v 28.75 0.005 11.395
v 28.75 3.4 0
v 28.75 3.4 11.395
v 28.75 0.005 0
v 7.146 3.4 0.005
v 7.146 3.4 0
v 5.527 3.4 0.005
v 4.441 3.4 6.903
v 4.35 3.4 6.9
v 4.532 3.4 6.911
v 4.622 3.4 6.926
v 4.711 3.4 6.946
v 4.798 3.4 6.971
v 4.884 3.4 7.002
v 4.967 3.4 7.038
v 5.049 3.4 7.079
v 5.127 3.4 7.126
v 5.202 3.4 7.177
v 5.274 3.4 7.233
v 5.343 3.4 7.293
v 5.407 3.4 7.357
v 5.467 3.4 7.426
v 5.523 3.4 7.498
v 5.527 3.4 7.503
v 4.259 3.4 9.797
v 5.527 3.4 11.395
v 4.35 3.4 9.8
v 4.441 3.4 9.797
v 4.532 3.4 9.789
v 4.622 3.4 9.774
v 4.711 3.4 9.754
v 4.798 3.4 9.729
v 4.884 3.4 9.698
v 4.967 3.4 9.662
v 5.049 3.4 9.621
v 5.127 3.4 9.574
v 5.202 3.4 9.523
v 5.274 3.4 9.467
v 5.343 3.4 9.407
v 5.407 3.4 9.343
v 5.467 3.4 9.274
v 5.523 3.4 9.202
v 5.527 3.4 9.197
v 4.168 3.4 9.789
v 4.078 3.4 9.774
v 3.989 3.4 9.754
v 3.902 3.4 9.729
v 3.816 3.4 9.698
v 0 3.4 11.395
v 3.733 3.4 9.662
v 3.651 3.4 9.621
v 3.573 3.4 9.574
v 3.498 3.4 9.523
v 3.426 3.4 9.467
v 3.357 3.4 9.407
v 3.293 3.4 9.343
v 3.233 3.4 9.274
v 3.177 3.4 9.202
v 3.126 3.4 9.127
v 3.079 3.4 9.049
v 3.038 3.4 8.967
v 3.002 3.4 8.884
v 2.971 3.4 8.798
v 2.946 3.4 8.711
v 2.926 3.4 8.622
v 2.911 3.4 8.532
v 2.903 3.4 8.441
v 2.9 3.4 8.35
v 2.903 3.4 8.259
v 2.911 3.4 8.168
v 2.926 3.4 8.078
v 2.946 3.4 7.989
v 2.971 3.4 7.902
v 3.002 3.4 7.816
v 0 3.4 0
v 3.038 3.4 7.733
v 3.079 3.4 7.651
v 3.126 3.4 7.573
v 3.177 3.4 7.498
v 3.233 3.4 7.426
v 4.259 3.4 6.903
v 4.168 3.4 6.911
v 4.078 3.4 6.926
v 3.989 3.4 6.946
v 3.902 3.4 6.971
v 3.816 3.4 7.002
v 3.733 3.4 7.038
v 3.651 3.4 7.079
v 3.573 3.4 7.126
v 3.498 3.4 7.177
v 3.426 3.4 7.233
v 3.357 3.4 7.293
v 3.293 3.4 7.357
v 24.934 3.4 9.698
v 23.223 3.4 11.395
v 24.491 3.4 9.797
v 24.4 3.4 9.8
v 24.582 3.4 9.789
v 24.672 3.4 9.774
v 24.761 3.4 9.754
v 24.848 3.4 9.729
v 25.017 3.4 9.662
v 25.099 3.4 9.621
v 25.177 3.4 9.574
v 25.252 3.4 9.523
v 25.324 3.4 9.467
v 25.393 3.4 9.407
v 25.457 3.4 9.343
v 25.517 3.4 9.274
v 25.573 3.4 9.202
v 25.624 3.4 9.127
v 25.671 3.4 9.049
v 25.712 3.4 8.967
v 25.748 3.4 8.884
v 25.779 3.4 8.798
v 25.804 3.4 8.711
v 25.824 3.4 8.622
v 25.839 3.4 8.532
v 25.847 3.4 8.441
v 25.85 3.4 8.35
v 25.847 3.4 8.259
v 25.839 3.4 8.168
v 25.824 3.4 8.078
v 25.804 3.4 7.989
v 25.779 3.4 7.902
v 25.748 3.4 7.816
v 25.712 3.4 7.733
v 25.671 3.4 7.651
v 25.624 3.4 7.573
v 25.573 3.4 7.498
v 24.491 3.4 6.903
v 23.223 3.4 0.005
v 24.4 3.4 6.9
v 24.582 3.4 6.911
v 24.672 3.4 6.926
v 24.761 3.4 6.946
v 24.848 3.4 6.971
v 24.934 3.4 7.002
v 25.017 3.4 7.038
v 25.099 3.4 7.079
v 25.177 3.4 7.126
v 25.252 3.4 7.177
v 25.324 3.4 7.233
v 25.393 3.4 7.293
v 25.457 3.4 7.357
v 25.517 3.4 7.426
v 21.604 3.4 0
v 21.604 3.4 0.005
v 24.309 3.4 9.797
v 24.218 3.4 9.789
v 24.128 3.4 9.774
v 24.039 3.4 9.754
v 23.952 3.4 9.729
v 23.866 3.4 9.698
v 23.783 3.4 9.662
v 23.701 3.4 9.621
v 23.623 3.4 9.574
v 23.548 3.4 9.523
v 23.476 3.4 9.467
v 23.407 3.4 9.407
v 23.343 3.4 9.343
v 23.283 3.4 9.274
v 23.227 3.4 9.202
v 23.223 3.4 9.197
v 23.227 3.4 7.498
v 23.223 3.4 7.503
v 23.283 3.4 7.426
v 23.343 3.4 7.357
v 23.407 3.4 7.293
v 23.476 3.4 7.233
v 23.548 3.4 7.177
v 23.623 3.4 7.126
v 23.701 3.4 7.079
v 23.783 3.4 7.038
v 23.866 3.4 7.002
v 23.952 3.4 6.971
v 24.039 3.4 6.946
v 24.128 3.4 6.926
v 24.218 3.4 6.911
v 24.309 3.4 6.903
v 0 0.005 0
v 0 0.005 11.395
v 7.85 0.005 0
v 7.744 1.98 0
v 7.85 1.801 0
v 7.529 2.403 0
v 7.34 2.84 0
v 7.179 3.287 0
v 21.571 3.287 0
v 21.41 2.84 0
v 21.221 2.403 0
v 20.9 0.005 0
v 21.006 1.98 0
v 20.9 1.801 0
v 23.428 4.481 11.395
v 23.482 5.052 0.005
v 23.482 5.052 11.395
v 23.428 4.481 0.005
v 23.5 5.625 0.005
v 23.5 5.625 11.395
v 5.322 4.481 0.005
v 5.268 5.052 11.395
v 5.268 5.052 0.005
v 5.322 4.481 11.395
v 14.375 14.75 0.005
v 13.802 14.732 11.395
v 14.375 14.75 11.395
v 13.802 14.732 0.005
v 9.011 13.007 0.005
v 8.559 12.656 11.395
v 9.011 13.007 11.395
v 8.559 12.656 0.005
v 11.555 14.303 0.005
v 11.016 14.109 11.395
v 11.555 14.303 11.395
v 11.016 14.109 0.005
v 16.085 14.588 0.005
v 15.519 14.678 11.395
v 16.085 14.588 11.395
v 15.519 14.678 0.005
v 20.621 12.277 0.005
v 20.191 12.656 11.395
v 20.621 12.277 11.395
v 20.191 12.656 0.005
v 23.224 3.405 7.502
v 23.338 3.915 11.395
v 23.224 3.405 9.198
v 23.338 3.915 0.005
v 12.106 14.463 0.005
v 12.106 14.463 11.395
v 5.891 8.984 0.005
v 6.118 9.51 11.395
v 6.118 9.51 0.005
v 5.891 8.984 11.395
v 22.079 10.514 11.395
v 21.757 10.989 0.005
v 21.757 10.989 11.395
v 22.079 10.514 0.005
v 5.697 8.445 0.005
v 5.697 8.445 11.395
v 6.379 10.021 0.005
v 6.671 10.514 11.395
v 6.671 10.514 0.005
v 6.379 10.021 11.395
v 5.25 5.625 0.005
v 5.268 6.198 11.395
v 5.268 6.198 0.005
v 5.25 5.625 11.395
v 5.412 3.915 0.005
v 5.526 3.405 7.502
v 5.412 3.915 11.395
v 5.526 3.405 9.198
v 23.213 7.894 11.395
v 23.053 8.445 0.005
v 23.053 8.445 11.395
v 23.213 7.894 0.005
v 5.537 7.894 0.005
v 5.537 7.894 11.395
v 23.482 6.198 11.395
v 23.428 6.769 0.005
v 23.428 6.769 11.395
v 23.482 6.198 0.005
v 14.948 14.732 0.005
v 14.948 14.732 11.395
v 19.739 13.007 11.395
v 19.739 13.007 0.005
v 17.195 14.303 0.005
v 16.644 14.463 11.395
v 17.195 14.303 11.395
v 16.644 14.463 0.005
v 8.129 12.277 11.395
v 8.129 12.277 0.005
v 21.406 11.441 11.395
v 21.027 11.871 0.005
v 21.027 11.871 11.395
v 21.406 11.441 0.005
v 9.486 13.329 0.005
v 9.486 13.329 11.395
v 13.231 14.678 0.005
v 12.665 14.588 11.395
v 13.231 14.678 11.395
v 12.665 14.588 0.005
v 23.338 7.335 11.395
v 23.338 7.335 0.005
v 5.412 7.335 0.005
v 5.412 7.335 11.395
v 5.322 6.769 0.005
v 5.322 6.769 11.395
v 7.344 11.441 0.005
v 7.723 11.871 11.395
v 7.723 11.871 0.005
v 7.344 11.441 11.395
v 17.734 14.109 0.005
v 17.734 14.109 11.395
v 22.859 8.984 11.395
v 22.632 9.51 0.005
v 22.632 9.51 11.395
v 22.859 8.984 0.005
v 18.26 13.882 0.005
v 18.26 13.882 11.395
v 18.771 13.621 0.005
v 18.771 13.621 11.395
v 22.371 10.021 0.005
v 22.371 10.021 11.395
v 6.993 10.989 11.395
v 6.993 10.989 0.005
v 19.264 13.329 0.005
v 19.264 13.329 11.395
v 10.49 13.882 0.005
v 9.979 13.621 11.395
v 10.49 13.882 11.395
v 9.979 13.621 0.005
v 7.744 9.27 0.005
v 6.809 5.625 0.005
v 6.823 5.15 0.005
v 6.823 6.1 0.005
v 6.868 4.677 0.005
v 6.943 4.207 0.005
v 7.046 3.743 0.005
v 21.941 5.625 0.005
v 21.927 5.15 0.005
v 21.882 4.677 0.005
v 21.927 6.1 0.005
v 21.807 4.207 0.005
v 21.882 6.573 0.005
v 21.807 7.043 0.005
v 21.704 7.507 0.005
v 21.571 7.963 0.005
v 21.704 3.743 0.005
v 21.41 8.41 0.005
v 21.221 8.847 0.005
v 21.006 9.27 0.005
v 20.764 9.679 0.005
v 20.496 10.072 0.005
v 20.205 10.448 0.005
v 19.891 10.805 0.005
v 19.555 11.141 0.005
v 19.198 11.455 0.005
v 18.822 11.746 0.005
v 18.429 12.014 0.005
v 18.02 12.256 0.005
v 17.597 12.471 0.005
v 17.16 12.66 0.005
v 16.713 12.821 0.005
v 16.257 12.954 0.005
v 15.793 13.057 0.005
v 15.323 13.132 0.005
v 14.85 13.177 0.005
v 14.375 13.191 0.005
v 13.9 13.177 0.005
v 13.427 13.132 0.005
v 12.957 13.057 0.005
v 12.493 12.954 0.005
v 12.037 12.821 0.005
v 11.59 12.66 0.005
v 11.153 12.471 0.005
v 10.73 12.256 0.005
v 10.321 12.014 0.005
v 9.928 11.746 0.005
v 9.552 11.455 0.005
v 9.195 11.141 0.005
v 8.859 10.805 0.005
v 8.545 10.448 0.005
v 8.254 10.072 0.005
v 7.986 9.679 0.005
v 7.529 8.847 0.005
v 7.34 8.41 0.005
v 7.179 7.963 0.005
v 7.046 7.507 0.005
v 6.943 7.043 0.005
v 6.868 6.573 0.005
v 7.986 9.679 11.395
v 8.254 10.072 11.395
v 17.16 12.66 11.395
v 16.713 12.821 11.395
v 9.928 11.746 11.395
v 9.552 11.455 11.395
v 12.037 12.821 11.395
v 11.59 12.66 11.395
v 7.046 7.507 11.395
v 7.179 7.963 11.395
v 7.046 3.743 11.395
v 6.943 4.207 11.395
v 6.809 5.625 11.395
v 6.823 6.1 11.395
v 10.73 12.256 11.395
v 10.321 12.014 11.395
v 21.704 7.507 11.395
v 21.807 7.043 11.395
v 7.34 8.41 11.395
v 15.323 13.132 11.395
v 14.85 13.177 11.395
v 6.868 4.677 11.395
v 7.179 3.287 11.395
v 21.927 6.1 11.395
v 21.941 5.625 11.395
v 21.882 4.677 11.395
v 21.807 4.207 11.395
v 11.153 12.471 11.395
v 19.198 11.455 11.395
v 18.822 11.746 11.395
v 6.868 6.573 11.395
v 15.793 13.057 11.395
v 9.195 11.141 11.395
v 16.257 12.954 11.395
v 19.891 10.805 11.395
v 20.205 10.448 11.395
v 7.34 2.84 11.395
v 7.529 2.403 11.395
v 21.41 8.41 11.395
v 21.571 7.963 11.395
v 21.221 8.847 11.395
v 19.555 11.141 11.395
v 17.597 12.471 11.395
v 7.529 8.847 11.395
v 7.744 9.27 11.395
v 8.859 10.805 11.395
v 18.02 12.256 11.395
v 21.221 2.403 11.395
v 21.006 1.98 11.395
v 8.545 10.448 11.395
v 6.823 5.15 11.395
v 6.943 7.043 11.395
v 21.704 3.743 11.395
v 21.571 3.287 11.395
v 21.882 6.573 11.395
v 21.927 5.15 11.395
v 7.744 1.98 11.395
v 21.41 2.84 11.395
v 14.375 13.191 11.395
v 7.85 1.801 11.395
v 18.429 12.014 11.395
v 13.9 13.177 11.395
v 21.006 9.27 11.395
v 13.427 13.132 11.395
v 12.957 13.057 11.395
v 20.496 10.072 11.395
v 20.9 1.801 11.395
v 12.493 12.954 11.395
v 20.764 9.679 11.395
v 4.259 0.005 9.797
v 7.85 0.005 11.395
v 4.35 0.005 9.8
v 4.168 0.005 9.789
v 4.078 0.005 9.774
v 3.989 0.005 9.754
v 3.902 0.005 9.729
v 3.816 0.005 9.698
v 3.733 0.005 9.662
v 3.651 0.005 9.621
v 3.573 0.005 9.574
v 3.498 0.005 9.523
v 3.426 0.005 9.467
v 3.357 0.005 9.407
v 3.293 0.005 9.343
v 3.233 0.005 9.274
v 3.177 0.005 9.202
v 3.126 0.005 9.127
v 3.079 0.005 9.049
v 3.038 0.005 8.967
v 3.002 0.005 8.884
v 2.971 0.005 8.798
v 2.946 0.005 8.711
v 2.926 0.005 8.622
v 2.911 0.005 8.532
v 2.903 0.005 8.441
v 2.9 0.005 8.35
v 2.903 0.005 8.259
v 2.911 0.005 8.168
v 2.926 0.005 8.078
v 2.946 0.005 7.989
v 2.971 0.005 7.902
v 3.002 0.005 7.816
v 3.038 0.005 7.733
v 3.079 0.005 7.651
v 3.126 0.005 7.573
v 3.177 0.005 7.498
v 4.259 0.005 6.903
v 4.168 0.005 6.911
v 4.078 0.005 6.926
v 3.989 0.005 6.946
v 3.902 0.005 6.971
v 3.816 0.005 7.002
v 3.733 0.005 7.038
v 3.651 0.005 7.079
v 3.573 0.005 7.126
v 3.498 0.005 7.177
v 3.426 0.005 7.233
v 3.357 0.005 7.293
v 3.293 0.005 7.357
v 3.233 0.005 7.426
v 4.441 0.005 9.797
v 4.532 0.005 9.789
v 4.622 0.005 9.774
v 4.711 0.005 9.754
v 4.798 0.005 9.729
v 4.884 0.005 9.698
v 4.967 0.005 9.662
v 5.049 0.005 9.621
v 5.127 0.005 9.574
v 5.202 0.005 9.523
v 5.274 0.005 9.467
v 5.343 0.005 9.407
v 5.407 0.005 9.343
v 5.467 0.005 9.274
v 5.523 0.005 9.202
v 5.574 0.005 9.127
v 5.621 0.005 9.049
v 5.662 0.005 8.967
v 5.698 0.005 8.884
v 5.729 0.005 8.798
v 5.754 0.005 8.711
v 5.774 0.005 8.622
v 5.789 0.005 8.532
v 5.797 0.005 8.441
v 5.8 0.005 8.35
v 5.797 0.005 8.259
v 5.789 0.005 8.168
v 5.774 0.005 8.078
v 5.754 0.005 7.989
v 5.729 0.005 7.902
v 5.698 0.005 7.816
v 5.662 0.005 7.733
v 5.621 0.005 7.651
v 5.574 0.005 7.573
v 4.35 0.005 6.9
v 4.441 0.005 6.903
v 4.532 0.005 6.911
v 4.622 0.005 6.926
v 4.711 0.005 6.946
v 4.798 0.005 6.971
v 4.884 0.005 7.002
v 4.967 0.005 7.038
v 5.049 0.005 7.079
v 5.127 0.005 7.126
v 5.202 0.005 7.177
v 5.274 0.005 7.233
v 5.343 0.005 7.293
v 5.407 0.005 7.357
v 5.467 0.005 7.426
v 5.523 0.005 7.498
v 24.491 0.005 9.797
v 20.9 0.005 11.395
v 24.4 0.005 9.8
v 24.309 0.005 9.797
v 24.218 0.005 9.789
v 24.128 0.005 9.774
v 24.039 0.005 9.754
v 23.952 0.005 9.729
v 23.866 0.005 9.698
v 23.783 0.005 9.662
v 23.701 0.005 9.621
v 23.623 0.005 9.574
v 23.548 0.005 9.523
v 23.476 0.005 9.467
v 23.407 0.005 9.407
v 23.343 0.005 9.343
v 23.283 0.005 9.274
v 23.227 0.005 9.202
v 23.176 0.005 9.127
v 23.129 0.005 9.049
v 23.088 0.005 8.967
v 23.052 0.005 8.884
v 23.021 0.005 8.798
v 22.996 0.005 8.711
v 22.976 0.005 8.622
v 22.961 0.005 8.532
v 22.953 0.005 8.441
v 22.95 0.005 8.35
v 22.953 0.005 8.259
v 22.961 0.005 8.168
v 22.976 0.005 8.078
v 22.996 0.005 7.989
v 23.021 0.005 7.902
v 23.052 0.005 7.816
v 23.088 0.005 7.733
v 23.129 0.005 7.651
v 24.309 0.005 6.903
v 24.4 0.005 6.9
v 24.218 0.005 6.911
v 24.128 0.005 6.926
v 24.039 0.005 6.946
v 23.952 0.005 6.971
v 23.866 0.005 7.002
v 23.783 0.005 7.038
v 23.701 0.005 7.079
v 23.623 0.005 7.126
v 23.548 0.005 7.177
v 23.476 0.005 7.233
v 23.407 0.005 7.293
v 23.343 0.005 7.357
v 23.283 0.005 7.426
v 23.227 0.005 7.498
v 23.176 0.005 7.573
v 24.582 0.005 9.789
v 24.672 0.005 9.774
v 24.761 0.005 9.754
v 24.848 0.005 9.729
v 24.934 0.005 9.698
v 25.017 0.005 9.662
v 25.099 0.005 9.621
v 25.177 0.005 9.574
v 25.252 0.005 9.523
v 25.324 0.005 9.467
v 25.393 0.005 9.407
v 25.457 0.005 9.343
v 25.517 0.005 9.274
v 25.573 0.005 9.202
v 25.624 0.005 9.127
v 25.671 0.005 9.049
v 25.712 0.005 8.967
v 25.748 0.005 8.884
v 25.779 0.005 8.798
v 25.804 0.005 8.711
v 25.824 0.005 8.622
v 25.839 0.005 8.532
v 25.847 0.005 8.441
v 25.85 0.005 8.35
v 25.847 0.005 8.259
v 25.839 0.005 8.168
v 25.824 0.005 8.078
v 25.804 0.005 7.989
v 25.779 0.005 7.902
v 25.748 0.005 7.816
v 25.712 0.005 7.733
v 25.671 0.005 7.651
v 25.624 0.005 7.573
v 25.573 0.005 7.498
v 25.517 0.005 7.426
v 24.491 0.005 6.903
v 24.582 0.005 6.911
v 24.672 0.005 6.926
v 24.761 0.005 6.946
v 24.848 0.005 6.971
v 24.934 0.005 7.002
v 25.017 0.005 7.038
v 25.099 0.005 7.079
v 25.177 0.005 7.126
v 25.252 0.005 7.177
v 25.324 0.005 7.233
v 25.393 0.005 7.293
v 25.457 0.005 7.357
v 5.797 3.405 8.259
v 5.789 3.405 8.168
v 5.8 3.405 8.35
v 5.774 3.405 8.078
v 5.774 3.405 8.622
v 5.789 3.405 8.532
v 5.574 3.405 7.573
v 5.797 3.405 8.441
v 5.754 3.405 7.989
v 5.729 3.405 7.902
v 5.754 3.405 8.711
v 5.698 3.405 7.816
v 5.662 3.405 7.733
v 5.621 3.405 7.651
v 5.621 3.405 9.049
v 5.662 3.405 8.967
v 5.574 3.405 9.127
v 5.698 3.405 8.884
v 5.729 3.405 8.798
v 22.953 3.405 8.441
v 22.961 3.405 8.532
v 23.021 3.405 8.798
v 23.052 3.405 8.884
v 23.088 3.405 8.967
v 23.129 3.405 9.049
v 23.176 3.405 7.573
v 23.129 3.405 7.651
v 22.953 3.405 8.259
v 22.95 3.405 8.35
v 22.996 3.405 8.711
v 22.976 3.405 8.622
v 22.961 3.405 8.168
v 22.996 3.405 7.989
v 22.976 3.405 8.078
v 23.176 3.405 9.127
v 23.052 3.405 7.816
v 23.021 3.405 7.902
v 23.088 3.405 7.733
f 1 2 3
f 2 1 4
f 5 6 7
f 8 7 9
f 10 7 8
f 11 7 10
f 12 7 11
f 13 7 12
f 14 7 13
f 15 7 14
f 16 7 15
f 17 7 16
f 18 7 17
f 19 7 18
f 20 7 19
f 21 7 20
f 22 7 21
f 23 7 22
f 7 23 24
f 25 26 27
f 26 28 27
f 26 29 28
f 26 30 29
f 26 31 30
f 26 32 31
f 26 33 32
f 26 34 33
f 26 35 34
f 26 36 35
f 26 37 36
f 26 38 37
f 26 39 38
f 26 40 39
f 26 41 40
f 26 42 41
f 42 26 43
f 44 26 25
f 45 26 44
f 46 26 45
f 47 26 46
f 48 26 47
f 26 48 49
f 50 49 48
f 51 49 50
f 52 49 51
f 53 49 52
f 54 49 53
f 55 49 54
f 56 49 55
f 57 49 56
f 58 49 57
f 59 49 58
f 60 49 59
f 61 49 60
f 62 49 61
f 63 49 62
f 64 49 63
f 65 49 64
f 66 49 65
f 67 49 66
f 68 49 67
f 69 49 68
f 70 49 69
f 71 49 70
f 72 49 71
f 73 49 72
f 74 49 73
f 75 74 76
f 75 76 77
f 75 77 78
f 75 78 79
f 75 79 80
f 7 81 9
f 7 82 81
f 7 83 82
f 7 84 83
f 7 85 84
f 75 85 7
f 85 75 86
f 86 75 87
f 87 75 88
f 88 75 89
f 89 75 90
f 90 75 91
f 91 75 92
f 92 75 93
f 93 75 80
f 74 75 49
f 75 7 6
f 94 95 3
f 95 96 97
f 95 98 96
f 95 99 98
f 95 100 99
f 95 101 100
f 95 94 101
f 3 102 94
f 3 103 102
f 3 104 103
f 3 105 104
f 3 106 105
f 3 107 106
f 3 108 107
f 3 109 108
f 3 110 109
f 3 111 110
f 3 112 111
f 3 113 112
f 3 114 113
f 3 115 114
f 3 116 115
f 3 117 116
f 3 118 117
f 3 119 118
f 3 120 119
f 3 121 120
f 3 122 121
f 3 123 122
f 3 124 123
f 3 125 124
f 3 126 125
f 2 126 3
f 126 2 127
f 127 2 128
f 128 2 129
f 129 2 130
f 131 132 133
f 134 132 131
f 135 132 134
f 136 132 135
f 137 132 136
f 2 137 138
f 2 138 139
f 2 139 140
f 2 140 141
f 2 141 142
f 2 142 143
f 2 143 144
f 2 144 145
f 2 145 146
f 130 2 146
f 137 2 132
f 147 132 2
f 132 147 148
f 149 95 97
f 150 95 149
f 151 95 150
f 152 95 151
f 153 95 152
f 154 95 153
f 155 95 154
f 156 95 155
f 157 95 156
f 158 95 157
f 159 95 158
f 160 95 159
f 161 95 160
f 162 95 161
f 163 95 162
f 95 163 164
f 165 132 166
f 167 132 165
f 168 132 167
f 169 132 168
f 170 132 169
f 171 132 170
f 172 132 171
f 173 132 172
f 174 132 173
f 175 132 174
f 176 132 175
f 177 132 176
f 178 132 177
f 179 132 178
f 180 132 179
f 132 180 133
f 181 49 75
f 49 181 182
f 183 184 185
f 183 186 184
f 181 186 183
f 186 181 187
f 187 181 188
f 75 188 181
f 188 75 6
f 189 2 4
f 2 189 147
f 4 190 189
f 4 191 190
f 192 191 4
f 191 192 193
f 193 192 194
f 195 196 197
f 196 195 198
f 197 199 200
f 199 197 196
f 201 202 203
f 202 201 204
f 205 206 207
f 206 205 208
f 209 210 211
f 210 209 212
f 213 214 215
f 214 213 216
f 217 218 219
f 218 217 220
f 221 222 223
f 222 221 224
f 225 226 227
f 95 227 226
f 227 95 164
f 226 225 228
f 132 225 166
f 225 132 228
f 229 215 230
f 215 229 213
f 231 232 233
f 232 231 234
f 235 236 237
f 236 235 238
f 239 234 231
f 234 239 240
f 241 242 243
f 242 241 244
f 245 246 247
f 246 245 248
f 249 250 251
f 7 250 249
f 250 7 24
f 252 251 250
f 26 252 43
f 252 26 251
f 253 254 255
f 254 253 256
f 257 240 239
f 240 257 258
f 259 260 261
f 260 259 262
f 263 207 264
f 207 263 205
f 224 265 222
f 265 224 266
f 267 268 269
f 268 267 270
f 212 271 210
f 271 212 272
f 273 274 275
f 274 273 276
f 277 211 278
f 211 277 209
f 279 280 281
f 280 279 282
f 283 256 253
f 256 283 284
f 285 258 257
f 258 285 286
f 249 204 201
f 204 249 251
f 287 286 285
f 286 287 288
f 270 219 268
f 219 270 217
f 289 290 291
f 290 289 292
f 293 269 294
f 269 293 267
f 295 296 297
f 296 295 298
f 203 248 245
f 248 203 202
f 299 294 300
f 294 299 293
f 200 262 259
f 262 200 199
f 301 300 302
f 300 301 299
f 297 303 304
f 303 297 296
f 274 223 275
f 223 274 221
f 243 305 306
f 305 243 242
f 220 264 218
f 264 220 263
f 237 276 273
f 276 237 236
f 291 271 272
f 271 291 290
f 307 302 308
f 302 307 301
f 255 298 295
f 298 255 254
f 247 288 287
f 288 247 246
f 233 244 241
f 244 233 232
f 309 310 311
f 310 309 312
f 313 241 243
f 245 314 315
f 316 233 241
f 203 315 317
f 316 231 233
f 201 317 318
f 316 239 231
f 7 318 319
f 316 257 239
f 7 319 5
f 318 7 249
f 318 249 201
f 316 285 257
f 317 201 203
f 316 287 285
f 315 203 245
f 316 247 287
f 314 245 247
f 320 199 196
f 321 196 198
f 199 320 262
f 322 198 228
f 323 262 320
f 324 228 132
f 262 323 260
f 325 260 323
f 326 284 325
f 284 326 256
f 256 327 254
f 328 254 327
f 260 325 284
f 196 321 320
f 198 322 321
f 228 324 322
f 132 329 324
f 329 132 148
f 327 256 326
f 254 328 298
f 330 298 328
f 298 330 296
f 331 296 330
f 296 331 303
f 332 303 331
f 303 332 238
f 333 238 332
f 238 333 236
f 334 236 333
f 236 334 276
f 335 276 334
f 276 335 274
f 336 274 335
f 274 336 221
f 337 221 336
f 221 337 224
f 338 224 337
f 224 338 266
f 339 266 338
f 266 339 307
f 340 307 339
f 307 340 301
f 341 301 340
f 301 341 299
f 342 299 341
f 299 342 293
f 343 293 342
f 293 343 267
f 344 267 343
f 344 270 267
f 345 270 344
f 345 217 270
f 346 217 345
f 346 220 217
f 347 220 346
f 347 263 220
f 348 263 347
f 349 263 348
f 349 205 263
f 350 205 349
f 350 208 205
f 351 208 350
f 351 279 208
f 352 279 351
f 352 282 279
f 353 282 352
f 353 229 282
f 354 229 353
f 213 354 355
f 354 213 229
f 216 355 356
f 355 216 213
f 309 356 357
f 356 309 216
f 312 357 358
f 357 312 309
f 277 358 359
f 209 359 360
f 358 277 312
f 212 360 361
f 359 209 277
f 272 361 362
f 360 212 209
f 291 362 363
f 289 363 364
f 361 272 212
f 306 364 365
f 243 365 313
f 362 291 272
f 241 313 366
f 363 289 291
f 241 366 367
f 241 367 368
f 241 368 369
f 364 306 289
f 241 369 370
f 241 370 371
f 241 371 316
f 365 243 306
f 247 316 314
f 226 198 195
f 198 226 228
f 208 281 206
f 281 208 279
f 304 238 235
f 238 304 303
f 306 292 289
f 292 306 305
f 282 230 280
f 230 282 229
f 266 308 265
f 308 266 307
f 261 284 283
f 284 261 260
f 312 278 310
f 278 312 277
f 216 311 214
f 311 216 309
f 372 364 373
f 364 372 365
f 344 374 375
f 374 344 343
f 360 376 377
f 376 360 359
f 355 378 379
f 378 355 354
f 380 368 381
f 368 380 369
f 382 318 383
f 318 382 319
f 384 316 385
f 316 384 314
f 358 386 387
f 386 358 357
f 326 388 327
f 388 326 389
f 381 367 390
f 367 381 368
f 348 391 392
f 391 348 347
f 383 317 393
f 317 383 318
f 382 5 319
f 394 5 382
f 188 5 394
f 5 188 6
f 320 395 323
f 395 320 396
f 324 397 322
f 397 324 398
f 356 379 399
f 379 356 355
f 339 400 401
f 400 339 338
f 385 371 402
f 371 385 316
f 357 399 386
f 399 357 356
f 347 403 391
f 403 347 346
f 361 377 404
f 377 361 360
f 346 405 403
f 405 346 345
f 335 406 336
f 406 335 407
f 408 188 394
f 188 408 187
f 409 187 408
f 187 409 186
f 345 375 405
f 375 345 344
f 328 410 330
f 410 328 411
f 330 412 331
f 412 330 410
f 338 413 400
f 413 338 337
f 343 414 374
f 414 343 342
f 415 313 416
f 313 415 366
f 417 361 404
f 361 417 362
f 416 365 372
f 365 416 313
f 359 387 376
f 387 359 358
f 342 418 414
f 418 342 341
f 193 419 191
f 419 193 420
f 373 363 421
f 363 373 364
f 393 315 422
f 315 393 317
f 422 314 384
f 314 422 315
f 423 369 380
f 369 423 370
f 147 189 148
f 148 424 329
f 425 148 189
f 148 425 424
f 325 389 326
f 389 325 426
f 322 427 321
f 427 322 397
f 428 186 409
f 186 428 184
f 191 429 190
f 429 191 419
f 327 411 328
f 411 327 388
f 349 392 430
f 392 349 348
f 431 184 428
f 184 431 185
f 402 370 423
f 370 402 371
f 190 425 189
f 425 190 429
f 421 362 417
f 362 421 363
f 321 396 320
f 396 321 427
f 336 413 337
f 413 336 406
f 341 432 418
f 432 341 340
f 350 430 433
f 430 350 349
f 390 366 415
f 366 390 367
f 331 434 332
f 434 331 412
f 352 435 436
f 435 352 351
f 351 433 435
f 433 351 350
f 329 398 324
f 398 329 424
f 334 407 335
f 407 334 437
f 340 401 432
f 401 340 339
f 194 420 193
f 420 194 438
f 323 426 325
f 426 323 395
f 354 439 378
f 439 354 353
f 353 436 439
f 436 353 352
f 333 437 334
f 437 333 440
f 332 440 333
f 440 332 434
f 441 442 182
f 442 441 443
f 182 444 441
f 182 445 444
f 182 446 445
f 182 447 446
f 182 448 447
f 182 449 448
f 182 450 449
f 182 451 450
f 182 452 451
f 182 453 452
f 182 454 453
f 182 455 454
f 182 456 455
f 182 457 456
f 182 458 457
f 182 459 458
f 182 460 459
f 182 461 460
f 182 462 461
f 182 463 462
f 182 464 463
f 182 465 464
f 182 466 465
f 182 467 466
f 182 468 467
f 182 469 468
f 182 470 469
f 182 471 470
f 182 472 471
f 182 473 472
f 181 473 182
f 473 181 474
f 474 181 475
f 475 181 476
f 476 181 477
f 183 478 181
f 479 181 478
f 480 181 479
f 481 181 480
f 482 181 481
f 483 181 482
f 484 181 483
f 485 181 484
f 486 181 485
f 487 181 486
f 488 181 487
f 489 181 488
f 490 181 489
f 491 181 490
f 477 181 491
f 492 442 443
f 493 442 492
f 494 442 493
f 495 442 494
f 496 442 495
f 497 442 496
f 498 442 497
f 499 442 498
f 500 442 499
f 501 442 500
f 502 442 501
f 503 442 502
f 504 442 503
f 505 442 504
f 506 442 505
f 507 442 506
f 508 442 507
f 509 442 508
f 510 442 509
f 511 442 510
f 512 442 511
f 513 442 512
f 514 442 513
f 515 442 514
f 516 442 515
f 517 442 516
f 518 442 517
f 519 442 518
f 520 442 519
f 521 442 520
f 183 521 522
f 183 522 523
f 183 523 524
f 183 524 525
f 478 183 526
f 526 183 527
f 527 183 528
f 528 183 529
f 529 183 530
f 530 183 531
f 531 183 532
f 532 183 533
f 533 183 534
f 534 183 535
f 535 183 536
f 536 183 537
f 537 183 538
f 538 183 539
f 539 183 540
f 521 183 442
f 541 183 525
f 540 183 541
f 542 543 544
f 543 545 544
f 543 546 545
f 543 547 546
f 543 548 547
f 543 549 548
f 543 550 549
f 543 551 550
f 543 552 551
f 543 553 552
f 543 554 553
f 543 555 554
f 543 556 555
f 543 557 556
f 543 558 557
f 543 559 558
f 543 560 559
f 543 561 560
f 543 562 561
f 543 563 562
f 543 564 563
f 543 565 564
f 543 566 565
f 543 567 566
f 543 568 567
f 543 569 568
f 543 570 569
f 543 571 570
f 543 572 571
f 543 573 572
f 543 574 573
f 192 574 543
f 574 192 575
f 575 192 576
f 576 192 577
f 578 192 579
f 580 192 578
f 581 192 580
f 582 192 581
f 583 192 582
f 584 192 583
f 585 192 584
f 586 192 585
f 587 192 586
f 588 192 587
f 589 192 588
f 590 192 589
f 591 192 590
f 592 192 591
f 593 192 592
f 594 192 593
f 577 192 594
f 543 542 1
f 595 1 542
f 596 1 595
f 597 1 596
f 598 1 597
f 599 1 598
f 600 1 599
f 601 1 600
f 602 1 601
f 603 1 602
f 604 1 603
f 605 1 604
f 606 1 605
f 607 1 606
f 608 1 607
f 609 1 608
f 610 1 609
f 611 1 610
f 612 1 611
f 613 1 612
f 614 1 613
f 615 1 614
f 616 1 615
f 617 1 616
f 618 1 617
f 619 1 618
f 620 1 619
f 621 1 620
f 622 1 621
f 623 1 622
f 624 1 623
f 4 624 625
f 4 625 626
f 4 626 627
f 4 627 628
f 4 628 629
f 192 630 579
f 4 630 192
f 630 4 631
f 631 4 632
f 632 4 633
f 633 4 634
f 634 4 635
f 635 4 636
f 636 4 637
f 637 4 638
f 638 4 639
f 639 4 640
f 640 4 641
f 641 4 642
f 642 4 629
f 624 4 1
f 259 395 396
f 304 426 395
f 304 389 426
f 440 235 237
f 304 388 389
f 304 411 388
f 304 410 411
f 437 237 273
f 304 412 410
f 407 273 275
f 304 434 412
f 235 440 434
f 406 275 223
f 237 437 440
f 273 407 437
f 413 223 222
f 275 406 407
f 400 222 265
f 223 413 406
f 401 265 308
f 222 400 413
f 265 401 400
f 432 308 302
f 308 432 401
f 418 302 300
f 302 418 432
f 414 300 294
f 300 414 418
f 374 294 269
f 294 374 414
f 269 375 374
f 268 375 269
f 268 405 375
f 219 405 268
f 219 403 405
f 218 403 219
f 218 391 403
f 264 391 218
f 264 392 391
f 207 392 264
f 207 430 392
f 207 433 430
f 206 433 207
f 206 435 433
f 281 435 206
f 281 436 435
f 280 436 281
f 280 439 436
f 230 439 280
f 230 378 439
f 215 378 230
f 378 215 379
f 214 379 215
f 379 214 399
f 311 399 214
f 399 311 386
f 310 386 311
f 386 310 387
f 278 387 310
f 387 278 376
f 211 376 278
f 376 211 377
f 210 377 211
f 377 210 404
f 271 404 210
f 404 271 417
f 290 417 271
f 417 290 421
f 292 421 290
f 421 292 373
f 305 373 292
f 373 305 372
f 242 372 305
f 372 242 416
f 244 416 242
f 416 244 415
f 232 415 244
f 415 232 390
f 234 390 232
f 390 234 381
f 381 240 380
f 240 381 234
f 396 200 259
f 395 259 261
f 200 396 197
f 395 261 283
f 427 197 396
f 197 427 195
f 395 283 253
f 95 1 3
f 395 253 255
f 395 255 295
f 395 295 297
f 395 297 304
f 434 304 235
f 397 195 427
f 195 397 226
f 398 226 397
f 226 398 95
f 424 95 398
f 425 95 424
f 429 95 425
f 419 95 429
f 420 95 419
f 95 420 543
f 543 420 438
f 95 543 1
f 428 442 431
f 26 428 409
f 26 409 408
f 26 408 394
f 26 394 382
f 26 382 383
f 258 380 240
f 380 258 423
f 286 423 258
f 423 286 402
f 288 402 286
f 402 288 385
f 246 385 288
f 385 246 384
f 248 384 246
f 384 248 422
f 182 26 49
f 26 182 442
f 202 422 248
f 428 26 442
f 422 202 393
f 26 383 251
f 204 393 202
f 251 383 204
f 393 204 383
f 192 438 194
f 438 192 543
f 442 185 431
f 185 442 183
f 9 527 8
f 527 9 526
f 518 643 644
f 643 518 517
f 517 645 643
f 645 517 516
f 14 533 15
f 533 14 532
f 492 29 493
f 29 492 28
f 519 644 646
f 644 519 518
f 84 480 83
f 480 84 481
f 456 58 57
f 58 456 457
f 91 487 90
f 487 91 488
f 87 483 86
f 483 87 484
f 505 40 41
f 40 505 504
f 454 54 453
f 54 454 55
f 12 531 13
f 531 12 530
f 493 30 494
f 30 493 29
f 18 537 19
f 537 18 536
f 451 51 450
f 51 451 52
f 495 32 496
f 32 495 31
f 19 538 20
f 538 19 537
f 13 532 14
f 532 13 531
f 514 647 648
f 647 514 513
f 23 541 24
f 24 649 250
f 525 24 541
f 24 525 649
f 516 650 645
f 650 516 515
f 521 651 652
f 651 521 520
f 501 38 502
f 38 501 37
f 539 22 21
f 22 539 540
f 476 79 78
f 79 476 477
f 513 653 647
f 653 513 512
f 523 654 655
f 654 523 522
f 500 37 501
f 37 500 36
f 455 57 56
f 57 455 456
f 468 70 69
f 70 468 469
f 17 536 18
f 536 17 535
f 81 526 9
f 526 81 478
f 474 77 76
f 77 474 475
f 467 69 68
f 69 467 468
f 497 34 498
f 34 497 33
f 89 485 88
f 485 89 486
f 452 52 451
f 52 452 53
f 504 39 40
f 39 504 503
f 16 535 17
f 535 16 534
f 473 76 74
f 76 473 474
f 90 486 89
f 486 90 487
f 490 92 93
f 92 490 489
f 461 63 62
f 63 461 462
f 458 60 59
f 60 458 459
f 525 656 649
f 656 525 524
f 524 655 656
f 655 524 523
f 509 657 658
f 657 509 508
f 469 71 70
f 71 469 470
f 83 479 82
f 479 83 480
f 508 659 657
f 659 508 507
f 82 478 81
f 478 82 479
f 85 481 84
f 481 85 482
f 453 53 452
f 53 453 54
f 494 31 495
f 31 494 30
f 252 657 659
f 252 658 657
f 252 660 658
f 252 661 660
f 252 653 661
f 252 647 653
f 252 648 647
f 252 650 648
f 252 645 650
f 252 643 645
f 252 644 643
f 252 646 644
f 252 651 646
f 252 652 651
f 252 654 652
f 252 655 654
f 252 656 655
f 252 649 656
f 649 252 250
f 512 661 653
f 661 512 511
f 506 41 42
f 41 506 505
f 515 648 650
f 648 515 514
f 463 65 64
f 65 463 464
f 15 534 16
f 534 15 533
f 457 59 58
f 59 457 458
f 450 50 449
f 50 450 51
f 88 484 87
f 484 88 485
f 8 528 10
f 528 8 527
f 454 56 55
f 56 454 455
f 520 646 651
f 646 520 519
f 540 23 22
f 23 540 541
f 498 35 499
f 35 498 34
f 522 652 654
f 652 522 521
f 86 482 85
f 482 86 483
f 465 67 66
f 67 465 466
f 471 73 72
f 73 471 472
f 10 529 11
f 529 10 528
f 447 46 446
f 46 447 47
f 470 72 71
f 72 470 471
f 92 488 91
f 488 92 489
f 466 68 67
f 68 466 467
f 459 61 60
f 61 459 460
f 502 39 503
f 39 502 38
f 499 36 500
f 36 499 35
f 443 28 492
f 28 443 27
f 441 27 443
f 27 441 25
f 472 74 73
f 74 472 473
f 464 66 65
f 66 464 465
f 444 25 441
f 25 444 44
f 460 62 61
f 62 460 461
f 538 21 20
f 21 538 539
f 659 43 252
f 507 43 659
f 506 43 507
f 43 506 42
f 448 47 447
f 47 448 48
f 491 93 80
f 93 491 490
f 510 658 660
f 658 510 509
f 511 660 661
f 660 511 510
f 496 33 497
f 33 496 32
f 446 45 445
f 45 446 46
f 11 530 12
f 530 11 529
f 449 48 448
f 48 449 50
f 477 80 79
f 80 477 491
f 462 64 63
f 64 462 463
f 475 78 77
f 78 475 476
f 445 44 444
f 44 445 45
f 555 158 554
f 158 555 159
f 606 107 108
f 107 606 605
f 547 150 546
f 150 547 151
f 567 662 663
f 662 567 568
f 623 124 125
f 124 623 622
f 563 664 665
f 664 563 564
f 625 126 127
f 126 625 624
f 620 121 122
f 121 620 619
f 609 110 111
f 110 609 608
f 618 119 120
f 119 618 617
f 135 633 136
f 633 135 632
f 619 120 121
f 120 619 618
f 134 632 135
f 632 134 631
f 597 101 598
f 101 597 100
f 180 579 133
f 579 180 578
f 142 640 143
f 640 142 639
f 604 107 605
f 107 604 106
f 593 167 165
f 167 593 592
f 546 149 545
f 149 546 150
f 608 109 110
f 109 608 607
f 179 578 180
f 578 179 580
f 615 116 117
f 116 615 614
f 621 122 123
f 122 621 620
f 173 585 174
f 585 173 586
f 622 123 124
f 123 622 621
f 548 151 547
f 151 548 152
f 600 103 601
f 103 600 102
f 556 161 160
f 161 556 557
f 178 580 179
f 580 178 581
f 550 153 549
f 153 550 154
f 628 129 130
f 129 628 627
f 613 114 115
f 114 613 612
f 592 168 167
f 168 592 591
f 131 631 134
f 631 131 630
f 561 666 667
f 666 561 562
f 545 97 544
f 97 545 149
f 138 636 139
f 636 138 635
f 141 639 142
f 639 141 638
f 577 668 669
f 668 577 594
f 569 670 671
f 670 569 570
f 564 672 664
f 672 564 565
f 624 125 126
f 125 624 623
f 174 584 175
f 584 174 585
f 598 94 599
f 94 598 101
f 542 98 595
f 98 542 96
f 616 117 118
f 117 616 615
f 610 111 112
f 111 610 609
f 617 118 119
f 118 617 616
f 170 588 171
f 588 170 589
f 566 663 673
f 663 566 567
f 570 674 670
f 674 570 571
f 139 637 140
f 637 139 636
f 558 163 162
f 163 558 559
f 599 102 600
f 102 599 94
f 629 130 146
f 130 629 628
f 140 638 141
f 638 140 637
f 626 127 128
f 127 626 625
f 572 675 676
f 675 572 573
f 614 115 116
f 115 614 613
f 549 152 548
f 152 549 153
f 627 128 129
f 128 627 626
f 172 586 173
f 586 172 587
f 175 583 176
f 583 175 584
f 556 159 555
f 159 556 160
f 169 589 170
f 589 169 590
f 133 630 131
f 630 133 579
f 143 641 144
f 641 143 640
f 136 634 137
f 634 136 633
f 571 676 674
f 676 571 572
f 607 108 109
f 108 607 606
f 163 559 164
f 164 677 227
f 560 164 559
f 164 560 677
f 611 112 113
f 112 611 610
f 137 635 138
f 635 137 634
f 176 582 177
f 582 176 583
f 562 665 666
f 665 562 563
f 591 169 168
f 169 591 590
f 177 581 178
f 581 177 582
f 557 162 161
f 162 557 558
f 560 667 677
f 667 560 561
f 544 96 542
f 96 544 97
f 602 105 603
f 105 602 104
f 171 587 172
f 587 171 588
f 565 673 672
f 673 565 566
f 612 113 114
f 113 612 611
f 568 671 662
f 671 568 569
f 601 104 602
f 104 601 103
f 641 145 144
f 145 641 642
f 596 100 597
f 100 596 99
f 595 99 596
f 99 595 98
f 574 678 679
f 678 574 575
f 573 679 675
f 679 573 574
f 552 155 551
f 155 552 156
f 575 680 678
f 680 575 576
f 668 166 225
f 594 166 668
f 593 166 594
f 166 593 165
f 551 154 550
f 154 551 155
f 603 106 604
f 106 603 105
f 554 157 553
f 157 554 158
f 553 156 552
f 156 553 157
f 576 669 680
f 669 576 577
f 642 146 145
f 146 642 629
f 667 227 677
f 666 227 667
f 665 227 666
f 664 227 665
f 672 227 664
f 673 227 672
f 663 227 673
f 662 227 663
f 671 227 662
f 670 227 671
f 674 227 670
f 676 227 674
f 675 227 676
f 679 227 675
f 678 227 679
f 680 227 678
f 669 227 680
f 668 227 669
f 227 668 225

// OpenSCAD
// model: Prusa i3 MK2 Y Chassis Bearing Straps
//        This replaces the zip ties that tend to stretch and can reduce accuracy over time.
// author: fiveangle@gmail.com
// date: 2016oct11
// ver: 1.0.0
//      1.0.1,Bushmills: improved rendering by eliminating faces resulting from OpenSCAD undecidedness whether
//                       to add or remove them, as many boundaries in difference() evaluated to identical planes. 
//                       I added variable "little" and used it to position and size primitives accordingly.
//                       Also removed a positioning bug, but refrained from attempting a much needed simplification.
// notes: Print 2x "left" and 1x "right". Use 6x M3x10mm button-head or socket-head screws to secure.
// history:
//     -1.0.0 - 2016oct11 - Released
//


$fn = 100;

bearingDiameter = 15.05; // [15.00:Tight - 15.00mm, 15.05:default - 15.05mm, 15.1:Loose - 15.10mm, 15.2:Lucy Goosey - 15.20mm]
bearingLength = 15.1; // [15.0:Tight - 15.00mm, 15.1:default (to ridge) - 15.05mm, 15.2:Loose - 15.20mm, 24.2:Full bearing length - 24.20mm]
bearingType = "left"; // [left:Left, right:right]
nozzleWidth = 0.4; // used to calculate strap thickness
shellsForStrap = 4; // adjust with nozzleWidth to get desired strap thickness
bearingRidgeDiameter = 14.6;
bearingRidgeWidth = 0.8;
mountLength = bearingLength + 2 * bearingRidgeWidth;
screwDiameter = 2.9; // [2.8:Tight - 2.8mm, 2.9:default - 2.9mm, 3.0:Loose 3.0mm]
mountHoleSeparation = 22.9 - (22.9 - 17.2) / 2;
strapThickness = shellsForStrap * nozzleWidth;
mountWidth = mountHoleSeparation + 3 * screwDiameter;
prusaYChassisThickness = 6.2; // Measurement of your Y Chassis thickness
prusaYChassisBearingSlotWidth = bearingDiameter - 2;
prusaYChassisbearingSinkage = 4.3; // Measure Y chassis to bearing distance using depth guage in bearing slot minus about 0.2 mm for pretension
mountTabThickness = (prusaYChassisThickness - prusaYChassisbearingSinkage) + 5;
mountDiameter = bearingDiameter + (2 * strapThickness);
mountHeight = mountDiameter;

little = 0.01;

// polyhole cylinder fitment method: http://hydraraptor.blogspot.com/2011/02/polyholes.html
module polyhole(d, h) {
    n = max(round(2 * d), 3);
    rotate([0, 0, 180])
        cylinder(h = h, r = (d / 2) / cos(180 / n));
}


module bearing() {
        difference() {
            // mount body
            union() {
                cube([mountWidth, mountLength, mountTabThickness]);

                translate([mountWidth / 2, +little/2, (bearingDiameter / 2) + strapThickness])
                    rotate([-90, 0, 0])
                        cylinder(r = (bearingDiameter / 2) + strapThickness, h = mountLength-little);

            }

            // bearing core
            union() {
                    translate([mountWidth / 2, 0, (bearingDiameter / 2) + strapThickness])
                        rotate([-90, 0, 0])
                            cylinder(r = ((bearingRidgeDiameter / 2)), h = mountLength);

                    translate([mountWidth / 2, (mountLength - bearingLength)+little/2, (bearingDiameter / 2) + strapThickness])
                        rotate([-90, 0, 0])
                            polyhole(bearingDiameter, bearingLength+little);

                }
                
            // prusa bearing sink
                translate([-little/2, -little/2, -little/2])
            cube([mountWidth + 10+little, mountLength+little, prusaYChassisThickness - prusaYChassisbearingSinkage + strapThickness+little]);

            if (bearingType == "left")
                translate([-little/2, -little/2, -little/2])
                cube([mountWidth+little, mountLength - (mountLength / 2 + screwDiameter / 2 + strapThickness)+little, bearingDiameter + 2 * strapThickness+little]);

            translate([mountWidth / 2 - prusaYChassisBearingSlotWidth / 2, little/2, 0])
                cube([prusaYChassisBearingSlotWidth, mountLength, (bearingDiameter + 2 * strapThickness) / 2]);



            translate([screwDiameter + screwDiameter / 2, mountLength / 2, -little/2])
                rotate([0, 0, 0])
                    cylinder(r = screwDiameter / 2, h = mountTabThickness+little);

            translate([mountWidth - screwDiameter - screwDiameter / 2, mountLength / 2, -little/2])
                rotate([0, 0, 0])
                    cylinder(r = screwDiameter / 2, h = mountTabThickness+little);
        }

    }


// doit
translate([0, -(prusaYChassisThickness - prusaYChassisbearingSinkage) - strapThickness, mountLength])
    rotate([-90, 0, 0])
        bearing();
